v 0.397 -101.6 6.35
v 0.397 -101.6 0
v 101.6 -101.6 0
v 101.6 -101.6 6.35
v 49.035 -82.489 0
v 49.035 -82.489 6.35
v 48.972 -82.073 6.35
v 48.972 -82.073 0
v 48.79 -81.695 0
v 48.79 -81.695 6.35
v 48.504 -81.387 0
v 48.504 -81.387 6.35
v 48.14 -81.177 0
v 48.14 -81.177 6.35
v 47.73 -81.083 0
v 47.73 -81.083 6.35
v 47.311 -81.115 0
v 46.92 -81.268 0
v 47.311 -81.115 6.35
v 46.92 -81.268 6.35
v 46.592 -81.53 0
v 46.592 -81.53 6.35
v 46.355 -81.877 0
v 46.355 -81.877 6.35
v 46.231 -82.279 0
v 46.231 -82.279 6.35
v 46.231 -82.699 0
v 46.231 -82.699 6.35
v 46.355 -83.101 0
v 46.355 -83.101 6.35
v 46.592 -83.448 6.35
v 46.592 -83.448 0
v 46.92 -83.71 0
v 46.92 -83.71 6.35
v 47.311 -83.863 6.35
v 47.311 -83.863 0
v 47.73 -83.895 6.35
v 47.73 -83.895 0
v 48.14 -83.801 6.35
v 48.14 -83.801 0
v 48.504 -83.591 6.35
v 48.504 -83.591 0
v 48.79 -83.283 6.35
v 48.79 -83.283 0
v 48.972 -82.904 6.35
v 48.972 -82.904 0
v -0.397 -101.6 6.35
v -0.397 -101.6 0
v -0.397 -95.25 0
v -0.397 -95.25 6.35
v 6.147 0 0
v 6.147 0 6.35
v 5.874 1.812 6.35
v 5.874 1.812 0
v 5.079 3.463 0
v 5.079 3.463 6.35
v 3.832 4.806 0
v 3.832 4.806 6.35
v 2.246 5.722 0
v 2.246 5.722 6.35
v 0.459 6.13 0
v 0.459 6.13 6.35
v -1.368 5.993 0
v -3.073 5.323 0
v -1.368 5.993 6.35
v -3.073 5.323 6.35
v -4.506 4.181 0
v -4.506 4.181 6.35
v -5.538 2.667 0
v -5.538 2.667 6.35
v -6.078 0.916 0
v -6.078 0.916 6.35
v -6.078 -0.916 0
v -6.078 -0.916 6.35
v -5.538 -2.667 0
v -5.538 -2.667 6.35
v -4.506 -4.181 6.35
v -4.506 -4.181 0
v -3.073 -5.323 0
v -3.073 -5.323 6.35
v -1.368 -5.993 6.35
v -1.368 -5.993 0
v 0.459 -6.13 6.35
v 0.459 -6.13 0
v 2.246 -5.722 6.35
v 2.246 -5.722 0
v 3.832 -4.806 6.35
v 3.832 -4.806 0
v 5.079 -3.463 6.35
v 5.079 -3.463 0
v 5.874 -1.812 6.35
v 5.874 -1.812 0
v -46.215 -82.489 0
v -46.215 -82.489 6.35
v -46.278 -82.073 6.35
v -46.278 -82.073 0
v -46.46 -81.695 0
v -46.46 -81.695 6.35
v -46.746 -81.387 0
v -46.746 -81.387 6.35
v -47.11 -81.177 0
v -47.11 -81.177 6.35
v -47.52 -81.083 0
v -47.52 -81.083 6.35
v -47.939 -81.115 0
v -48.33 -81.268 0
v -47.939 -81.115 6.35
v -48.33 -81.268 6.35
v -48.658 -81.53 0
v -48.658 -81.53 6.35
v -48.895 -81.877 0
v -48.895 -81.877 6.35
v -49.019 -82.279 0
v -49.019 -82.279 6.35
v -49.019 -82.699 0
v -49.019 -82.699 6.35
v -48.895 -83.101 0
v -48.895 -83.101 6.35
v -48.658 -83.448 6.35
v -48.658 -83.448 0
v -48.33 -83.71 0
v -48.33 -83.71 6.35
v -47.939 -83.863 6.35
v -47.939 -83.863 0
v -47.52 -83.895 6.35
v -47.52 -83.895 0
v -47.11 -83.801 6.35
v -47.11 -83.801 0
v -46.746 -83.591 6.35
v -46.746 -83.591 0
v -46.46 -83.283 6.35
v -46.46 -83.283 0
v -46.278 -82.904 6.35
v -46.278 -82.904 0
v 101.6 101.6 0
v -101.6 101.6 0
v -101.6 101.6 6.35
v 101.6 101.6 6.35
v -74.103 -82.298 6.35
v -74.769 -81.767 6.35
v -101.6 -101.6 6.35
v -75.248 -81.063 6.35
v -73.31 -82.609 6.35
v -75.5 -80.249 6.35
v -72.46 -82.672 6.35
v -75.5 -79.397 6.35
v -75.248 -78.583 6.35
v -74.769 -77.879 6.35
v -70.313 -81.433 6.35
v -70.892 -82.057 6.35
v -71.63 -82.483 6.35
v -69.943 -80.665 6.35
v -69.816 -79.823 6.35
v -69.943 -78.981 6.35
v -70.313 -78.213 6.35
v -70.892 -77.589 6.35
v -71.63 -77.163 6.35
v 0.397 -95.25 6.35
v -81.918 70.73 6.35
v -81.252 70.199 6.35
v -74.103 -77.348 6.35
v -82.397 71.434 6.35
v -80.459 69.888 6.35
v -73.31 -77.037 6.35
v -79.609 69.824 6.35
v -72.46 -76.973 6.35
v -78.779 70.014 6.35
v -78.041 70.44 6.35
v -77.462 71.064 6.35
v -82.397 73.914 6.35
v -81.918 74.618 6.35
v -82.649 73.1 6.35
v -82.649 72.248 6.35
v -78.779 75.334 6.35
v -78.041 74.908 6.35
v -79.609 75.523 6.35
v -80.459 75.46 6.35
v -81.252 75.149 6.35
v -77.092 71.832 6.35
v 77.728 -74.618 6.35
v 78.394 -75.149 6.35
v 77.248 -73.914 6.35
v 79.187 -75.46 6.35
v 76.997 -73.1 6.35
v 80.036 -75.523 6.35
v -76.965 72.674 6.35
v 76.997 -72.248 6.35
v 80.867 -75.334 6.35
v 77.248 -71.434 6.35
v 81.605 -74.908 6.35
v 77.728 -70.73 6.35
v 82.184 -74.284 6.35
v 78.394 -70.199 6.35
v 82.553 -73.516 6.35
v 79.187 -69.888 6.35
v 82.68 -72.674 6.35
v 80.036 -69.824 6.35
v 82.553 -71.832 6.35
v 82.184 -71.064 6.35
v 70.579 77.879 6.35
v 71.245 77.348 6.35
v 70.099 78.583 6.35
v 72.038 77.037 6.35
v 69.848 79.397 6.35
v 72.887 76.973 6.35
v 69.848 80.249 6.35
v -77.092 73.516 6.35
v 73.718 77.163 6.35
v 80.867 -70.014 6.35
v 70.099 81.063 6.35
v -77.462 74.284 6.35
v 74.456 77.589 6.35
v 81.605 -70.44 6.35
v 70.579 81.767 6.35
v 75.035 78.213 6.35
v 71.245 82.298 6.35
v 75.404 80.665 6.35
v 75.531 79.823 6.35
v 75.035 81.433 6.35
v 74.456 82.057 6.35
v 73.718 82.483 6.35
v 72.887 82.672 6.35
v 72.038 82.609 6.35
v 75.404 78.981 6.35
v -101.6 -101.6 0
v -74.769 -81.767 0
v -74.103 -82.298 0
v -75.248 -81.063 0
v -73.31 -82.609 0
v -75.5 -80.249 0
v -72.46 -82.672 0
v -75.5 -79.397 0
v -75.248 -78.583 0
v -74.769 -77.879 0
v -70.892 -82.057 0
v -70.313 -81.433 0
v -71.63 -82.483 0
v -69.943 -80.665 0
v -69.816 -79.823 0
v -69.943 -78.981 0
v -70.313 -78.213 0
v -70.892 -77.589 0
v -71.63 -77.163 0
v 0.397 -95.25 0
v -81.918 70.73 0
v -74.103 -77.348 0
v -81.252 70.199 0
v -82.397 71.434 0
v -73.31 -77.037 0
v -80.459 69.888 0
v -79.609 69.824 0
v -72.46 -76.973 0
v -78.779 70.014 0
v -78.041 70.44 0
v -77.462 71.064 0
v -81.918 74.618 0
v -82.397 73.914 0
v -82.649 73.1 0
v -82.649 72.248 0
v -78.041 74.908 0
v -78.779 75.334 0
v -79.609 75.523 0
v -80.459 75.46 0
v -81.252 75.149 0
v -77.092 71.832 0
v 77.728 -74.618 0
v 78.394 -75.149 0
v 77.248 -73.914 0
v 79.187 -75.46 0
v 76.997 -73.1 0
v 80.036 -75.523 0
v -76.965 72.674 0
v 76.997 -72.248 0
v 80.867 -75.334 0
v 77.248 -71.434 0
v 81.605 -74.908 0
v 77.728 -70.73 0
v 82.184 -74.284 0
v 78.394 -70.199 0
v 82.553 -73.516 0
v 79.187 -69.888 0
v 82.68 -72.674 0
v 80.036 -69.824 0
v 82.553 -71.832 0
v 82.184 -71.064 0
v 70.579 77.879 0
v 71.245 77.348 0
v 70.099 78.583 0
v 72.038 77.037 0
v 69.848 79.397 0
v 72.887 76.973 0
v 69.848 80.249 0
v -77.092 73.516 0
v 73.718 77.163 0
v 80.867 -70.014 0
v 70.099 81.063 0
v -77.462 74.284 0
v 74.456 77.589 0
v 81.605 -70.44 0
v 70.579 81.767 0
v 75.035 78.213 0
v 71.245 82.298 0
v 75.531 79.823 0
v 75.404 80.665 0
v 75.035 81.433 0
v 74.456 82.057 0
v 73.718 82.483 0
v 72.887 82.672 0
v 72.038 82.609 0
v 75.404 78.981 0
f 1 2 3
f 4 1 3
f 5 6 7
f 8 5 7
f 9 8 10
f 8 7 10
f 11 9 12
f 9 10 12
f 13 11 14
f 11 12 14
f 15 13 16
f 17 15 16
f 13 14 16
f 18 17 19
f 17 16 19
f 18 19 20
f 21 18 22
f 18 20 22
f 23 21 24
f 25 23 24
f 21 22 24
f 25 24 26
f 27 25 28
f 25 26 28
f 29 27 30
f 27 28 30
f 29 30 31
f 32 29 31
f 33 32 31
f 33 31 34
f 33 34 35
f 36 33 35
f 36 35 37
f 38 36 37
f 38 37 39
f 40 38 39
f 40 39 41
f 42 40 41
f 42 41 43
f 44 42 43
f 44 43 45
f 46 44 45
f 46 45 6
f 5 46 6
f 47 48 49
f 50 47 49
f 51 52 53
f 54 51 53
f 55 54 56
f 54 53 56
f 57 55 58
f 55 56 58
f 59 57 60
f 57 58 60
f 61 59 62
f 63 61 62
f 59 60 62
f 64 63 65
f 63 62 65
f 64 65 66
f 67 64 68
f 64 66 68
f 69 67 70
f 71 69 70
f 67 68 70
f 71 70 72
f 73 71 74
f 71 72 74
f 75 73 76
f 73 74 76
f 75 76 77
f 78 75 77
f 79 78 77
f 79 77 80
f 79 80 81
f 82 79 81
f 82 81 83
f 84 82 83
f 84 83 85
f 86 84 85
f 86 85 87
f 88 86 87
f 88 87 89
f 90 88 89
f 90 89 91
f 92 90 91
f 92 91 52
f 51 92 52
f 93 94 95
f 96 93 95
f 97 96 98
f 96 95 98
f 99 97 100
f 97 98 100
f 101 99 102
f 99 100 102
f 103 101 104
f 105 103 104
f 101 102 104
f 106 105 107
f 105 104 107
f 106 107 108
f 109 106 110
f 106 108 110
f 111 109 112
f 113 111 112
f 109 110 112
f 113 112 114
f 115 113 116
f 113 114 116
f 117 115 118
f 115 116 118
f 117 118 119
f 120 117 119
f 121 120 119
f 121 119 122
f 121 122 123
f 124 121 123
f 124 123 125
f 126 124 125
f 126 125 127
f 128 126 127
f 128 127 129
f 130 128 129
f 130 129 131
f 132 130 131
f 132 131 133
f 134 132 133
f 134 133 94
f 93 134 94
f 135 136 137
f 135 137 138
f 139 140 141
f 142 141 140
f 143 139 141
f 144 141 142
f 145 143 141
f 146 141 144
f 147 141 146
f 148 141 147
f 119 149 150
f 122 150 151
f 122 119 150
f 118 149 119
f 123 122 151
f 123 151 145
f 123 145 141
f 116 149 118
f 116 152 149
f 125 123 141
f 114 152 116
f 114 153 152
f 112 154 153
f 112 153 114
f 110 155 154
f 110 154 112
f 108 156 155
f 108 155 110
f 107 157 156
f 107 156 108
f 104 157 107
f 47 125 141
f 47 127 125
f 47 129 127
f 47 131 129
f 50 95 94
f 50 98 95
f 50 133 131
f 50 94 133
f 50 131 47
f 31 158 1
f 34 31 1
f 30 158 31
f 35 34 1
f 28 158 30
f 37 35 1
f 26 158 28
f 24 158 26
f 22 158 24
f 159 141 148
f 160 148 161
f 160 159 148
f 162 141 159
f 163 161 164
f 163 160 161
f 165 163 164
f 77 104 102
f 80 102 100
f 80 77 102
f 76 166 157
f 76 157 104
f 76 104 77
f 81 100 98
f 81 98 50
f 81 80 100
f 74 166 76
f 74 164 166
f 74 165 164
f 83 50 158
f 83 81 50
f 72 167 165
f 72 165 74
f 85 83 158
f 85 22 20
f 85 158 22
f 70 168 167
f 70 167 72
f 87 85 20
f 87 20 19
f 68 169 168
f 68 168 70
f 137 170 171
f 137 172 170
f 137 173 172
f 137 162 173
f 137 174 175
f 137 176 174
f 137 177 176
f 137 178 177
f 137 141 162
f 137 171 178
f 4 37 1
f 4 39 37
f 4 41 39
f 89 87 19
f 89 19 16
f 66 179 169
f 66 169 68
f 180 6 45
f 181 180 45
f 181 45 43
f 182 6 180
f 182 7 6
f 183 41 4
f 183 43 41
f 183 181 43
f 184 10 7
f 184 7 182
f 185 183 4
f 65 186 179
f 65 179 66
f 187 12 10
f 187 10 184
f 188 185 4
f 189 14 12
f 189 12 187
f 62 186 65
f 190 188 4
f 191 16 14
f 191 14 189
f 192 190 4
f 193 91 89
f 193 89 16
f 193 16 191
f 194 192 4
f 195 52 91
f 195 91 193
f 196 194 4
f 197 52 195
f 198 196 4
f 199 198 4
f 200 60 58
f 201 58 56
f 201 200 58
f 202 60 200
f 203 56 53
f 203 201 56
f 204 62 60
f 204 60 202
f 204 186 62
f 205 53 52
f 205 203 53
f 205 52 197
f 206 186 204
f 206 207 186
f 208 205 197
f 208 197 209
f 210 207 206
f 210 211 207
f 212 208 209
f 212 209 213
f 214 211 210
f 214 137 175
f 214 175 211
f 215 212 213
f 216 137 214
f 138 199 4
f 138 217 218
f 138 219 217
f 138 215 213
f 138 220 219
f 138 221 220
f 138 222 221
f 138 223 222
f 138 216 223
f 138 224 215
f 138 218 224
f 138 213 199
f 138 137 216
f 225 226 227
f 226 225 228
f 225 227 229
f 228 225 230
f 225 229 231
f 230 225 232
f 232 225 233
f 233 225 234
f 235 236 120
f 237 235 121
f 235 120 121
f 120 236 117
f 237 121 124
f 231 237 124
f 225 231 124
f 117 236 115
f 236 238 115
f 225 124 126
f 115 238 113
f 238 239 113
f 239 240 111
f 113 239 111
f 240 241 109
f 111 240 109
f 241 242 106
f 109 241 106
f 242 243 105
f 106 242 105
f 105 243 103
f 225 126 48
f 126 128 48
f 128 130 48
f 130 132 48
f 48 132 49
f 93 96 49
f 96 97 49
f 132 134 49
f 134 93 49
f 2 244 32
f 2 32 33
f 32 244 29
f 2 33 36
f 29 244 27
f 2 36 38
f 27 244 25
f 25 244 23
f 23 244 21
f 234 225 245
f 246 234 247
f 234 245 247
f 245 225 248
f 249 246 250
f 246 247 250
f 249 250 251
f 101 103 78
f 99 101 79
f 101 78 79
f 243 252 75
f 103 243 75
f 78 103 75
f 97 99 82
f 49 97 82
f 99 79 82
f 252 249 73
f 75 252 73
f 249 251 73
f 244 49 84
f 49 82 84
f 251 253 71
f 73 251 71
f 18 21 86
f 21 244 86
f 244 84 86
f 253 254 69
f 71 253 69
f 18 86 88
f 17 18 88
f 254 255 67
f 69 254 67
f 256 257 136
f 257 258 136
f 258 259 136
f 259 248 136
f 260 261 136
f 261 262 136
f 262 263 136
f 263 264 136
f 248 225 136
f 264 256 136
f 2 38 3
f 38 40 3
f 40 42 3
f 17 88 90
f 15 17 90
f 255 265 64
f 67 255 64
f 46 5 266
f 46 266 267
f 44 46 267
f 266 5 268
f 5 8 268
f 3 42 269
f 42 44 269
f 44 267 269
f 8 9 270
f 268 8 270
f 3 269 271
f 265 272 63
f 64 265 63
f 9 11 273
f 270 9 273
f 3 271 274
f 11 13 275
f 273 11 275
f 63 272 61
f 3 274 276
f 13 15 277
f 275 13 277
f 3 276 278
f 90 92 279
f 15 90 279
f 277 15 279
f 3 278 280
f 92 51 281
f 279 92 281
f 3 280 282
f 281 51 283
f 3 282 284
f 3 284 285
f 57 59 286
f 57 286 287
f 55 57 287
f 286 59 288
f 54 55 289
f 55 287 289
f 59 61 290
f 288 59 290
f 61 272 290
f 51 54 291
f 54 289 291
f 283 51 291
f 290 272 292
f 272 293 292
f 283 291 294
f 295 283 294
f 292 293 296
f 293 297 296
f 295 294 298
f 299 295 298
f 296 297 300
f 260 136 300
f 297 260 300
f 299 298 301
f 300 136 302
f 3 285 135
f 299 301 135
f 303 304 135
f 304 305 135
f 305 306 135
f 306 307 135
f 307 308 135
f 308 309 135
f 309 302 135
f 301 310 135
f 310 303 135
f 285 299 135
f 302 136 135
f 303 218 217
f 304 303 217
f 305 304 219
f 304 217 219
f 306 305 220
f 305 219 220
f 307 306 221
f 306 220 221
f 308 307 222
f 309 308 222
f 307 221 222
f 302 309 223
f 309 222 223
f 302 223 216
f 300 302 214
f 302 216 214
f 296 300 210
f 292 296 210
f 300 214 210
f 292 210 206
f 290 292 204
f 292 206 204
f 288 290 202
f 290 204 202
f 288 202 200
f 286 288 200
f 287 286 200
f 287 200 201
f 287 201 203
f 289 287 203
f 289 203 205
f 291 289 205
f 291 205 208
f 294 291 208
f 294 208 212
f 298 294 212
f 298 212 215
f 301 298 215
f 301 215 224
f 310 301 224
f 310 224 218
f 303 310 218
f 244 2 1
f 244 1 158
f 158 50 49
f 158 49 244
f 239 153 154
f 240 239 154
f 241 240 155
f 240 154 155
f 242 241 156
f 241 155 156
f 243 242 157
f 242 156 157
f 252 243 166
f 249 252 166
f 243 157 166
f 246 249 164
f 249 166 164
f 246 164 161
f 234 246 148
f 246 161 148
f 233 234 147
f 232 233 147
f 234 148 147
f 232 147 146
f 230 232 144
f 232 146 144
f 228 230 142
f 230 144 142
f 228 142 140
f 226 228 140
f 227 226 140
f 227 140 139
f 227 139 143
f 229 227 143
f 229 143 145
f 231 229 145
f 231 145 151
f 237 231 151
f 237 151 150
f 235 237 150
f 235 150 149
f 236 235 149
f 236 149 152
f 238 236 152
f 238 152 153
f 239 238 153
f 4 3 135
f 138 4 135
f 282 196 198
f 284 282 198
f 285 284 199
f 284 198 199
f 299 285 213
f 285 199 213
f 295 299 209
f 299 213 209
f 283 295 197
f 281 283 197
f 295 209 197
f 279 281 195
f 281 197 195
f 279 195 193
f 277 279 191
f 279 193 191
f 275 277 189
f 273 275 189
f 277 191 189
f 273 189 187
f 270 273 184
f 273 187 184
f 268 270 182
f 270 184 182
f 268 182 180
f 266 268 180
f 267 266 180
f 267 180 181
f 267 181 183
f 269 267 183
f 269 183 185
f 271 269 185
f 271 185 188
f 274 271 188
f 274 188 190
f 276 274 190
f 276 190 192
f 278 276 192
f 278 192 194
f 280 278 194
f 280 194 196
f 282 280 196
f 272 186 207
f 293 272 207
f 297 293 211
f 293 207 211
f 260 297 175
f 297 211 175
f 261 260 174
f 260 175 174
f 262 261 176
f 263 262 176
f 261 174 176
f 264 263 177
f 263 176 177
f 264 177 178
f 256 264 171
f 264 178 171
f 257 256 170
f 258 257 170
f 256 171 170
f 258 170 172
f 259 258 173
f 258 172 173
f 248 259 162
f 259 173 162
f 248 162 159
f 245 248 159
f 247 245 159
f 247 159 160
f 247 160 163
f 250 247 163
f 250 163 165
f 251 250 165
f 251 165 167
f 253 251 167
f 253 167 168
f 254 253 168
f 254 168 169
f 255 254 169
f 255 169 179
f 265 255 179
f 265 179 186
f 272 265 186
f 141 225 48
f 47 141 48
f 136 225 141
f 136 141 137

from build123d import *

# Parameters (mm, degrees)
SKETCH1_W      = 203.2
SKETCH1_H      = 203.2
EXTRUDE1_DEPTH = 6.35
SKETCH2_R      = 6.1468
EXTRUDE2_DEPTH = 144.824345992
SKETCH3_R      = 1.4097
EXTRUDE3_DEPTH = 144.824345992
SKETCH4_W      = 0.79375
SKETCH4_H      = 6.35
EXTRUDE4_DEPTH = 6.35
SKETCH5_R      = 2.8575
EXTRUDE5_DEPTH = 144.824345992


with BuildPart() as part:
    # Sketch1 → Extrude1 (new body)
    with BuildSketch(Plane.XY):
        Rectangle(SKETCH1_W, SKETCH1_H)
    extrude(amount=EXTRUDE1_DEPTH)

    # Sketch2 → Extrude2 (cut, through all)
    with BuildSketch(Plane.XY.offset(6.35)):
        Circle(SKETCH2_R)
    extrude(amount=-EXTRUDE2_DEPTH, mode=Mode.SUBTRACT)

    # Sketch3 → Extrude3 (cut, through all)
    with BuildSketch(Plane.XY.offset(6.35)):
        with Locations((-47.625, -82.48891971)):
            Circle(SKETCH3_R)
        with Locations((47.625, -82.48891971)):
            Circle(SKETCH3_R)
    extrude(amount=-EXTRUDE3_DEPTH, mode=Mode.SUBTRACT)

    # Sketch4 → Extrude4 (cut)
    with BuildSketch(Plane.XY.offset(6.35)):
        with Locations((0, -98.425)):
            Rectangle(SKETCH4_W, SKETCH4_H)
    extrude(amount=-EXTRUDE4_DEPTH, mode=Mode.SUBTRACT)

    # Sketch5 → Extrude5 (cut, through all)
    with BuildSketch(Plane.XY.offset(6.35)):
        with Locations((-79.82293888, 72.673935689)):
            Circle(SKETCH5_R)
        with Locations((72.673935689, 79.82293888)):
            Circle(SKETCH5_R)
        with Locations((-72.673935689, -79.82293888)):
            Circle(SKETCH5_R)
        with Locations((79.82293888, -72.673935689)):
            Circle(SKETCH5_R)
    extrude(amount=-EXTRUDE5_DEPTH, mode=Mode.SUBTRACT)


solid = part.part
